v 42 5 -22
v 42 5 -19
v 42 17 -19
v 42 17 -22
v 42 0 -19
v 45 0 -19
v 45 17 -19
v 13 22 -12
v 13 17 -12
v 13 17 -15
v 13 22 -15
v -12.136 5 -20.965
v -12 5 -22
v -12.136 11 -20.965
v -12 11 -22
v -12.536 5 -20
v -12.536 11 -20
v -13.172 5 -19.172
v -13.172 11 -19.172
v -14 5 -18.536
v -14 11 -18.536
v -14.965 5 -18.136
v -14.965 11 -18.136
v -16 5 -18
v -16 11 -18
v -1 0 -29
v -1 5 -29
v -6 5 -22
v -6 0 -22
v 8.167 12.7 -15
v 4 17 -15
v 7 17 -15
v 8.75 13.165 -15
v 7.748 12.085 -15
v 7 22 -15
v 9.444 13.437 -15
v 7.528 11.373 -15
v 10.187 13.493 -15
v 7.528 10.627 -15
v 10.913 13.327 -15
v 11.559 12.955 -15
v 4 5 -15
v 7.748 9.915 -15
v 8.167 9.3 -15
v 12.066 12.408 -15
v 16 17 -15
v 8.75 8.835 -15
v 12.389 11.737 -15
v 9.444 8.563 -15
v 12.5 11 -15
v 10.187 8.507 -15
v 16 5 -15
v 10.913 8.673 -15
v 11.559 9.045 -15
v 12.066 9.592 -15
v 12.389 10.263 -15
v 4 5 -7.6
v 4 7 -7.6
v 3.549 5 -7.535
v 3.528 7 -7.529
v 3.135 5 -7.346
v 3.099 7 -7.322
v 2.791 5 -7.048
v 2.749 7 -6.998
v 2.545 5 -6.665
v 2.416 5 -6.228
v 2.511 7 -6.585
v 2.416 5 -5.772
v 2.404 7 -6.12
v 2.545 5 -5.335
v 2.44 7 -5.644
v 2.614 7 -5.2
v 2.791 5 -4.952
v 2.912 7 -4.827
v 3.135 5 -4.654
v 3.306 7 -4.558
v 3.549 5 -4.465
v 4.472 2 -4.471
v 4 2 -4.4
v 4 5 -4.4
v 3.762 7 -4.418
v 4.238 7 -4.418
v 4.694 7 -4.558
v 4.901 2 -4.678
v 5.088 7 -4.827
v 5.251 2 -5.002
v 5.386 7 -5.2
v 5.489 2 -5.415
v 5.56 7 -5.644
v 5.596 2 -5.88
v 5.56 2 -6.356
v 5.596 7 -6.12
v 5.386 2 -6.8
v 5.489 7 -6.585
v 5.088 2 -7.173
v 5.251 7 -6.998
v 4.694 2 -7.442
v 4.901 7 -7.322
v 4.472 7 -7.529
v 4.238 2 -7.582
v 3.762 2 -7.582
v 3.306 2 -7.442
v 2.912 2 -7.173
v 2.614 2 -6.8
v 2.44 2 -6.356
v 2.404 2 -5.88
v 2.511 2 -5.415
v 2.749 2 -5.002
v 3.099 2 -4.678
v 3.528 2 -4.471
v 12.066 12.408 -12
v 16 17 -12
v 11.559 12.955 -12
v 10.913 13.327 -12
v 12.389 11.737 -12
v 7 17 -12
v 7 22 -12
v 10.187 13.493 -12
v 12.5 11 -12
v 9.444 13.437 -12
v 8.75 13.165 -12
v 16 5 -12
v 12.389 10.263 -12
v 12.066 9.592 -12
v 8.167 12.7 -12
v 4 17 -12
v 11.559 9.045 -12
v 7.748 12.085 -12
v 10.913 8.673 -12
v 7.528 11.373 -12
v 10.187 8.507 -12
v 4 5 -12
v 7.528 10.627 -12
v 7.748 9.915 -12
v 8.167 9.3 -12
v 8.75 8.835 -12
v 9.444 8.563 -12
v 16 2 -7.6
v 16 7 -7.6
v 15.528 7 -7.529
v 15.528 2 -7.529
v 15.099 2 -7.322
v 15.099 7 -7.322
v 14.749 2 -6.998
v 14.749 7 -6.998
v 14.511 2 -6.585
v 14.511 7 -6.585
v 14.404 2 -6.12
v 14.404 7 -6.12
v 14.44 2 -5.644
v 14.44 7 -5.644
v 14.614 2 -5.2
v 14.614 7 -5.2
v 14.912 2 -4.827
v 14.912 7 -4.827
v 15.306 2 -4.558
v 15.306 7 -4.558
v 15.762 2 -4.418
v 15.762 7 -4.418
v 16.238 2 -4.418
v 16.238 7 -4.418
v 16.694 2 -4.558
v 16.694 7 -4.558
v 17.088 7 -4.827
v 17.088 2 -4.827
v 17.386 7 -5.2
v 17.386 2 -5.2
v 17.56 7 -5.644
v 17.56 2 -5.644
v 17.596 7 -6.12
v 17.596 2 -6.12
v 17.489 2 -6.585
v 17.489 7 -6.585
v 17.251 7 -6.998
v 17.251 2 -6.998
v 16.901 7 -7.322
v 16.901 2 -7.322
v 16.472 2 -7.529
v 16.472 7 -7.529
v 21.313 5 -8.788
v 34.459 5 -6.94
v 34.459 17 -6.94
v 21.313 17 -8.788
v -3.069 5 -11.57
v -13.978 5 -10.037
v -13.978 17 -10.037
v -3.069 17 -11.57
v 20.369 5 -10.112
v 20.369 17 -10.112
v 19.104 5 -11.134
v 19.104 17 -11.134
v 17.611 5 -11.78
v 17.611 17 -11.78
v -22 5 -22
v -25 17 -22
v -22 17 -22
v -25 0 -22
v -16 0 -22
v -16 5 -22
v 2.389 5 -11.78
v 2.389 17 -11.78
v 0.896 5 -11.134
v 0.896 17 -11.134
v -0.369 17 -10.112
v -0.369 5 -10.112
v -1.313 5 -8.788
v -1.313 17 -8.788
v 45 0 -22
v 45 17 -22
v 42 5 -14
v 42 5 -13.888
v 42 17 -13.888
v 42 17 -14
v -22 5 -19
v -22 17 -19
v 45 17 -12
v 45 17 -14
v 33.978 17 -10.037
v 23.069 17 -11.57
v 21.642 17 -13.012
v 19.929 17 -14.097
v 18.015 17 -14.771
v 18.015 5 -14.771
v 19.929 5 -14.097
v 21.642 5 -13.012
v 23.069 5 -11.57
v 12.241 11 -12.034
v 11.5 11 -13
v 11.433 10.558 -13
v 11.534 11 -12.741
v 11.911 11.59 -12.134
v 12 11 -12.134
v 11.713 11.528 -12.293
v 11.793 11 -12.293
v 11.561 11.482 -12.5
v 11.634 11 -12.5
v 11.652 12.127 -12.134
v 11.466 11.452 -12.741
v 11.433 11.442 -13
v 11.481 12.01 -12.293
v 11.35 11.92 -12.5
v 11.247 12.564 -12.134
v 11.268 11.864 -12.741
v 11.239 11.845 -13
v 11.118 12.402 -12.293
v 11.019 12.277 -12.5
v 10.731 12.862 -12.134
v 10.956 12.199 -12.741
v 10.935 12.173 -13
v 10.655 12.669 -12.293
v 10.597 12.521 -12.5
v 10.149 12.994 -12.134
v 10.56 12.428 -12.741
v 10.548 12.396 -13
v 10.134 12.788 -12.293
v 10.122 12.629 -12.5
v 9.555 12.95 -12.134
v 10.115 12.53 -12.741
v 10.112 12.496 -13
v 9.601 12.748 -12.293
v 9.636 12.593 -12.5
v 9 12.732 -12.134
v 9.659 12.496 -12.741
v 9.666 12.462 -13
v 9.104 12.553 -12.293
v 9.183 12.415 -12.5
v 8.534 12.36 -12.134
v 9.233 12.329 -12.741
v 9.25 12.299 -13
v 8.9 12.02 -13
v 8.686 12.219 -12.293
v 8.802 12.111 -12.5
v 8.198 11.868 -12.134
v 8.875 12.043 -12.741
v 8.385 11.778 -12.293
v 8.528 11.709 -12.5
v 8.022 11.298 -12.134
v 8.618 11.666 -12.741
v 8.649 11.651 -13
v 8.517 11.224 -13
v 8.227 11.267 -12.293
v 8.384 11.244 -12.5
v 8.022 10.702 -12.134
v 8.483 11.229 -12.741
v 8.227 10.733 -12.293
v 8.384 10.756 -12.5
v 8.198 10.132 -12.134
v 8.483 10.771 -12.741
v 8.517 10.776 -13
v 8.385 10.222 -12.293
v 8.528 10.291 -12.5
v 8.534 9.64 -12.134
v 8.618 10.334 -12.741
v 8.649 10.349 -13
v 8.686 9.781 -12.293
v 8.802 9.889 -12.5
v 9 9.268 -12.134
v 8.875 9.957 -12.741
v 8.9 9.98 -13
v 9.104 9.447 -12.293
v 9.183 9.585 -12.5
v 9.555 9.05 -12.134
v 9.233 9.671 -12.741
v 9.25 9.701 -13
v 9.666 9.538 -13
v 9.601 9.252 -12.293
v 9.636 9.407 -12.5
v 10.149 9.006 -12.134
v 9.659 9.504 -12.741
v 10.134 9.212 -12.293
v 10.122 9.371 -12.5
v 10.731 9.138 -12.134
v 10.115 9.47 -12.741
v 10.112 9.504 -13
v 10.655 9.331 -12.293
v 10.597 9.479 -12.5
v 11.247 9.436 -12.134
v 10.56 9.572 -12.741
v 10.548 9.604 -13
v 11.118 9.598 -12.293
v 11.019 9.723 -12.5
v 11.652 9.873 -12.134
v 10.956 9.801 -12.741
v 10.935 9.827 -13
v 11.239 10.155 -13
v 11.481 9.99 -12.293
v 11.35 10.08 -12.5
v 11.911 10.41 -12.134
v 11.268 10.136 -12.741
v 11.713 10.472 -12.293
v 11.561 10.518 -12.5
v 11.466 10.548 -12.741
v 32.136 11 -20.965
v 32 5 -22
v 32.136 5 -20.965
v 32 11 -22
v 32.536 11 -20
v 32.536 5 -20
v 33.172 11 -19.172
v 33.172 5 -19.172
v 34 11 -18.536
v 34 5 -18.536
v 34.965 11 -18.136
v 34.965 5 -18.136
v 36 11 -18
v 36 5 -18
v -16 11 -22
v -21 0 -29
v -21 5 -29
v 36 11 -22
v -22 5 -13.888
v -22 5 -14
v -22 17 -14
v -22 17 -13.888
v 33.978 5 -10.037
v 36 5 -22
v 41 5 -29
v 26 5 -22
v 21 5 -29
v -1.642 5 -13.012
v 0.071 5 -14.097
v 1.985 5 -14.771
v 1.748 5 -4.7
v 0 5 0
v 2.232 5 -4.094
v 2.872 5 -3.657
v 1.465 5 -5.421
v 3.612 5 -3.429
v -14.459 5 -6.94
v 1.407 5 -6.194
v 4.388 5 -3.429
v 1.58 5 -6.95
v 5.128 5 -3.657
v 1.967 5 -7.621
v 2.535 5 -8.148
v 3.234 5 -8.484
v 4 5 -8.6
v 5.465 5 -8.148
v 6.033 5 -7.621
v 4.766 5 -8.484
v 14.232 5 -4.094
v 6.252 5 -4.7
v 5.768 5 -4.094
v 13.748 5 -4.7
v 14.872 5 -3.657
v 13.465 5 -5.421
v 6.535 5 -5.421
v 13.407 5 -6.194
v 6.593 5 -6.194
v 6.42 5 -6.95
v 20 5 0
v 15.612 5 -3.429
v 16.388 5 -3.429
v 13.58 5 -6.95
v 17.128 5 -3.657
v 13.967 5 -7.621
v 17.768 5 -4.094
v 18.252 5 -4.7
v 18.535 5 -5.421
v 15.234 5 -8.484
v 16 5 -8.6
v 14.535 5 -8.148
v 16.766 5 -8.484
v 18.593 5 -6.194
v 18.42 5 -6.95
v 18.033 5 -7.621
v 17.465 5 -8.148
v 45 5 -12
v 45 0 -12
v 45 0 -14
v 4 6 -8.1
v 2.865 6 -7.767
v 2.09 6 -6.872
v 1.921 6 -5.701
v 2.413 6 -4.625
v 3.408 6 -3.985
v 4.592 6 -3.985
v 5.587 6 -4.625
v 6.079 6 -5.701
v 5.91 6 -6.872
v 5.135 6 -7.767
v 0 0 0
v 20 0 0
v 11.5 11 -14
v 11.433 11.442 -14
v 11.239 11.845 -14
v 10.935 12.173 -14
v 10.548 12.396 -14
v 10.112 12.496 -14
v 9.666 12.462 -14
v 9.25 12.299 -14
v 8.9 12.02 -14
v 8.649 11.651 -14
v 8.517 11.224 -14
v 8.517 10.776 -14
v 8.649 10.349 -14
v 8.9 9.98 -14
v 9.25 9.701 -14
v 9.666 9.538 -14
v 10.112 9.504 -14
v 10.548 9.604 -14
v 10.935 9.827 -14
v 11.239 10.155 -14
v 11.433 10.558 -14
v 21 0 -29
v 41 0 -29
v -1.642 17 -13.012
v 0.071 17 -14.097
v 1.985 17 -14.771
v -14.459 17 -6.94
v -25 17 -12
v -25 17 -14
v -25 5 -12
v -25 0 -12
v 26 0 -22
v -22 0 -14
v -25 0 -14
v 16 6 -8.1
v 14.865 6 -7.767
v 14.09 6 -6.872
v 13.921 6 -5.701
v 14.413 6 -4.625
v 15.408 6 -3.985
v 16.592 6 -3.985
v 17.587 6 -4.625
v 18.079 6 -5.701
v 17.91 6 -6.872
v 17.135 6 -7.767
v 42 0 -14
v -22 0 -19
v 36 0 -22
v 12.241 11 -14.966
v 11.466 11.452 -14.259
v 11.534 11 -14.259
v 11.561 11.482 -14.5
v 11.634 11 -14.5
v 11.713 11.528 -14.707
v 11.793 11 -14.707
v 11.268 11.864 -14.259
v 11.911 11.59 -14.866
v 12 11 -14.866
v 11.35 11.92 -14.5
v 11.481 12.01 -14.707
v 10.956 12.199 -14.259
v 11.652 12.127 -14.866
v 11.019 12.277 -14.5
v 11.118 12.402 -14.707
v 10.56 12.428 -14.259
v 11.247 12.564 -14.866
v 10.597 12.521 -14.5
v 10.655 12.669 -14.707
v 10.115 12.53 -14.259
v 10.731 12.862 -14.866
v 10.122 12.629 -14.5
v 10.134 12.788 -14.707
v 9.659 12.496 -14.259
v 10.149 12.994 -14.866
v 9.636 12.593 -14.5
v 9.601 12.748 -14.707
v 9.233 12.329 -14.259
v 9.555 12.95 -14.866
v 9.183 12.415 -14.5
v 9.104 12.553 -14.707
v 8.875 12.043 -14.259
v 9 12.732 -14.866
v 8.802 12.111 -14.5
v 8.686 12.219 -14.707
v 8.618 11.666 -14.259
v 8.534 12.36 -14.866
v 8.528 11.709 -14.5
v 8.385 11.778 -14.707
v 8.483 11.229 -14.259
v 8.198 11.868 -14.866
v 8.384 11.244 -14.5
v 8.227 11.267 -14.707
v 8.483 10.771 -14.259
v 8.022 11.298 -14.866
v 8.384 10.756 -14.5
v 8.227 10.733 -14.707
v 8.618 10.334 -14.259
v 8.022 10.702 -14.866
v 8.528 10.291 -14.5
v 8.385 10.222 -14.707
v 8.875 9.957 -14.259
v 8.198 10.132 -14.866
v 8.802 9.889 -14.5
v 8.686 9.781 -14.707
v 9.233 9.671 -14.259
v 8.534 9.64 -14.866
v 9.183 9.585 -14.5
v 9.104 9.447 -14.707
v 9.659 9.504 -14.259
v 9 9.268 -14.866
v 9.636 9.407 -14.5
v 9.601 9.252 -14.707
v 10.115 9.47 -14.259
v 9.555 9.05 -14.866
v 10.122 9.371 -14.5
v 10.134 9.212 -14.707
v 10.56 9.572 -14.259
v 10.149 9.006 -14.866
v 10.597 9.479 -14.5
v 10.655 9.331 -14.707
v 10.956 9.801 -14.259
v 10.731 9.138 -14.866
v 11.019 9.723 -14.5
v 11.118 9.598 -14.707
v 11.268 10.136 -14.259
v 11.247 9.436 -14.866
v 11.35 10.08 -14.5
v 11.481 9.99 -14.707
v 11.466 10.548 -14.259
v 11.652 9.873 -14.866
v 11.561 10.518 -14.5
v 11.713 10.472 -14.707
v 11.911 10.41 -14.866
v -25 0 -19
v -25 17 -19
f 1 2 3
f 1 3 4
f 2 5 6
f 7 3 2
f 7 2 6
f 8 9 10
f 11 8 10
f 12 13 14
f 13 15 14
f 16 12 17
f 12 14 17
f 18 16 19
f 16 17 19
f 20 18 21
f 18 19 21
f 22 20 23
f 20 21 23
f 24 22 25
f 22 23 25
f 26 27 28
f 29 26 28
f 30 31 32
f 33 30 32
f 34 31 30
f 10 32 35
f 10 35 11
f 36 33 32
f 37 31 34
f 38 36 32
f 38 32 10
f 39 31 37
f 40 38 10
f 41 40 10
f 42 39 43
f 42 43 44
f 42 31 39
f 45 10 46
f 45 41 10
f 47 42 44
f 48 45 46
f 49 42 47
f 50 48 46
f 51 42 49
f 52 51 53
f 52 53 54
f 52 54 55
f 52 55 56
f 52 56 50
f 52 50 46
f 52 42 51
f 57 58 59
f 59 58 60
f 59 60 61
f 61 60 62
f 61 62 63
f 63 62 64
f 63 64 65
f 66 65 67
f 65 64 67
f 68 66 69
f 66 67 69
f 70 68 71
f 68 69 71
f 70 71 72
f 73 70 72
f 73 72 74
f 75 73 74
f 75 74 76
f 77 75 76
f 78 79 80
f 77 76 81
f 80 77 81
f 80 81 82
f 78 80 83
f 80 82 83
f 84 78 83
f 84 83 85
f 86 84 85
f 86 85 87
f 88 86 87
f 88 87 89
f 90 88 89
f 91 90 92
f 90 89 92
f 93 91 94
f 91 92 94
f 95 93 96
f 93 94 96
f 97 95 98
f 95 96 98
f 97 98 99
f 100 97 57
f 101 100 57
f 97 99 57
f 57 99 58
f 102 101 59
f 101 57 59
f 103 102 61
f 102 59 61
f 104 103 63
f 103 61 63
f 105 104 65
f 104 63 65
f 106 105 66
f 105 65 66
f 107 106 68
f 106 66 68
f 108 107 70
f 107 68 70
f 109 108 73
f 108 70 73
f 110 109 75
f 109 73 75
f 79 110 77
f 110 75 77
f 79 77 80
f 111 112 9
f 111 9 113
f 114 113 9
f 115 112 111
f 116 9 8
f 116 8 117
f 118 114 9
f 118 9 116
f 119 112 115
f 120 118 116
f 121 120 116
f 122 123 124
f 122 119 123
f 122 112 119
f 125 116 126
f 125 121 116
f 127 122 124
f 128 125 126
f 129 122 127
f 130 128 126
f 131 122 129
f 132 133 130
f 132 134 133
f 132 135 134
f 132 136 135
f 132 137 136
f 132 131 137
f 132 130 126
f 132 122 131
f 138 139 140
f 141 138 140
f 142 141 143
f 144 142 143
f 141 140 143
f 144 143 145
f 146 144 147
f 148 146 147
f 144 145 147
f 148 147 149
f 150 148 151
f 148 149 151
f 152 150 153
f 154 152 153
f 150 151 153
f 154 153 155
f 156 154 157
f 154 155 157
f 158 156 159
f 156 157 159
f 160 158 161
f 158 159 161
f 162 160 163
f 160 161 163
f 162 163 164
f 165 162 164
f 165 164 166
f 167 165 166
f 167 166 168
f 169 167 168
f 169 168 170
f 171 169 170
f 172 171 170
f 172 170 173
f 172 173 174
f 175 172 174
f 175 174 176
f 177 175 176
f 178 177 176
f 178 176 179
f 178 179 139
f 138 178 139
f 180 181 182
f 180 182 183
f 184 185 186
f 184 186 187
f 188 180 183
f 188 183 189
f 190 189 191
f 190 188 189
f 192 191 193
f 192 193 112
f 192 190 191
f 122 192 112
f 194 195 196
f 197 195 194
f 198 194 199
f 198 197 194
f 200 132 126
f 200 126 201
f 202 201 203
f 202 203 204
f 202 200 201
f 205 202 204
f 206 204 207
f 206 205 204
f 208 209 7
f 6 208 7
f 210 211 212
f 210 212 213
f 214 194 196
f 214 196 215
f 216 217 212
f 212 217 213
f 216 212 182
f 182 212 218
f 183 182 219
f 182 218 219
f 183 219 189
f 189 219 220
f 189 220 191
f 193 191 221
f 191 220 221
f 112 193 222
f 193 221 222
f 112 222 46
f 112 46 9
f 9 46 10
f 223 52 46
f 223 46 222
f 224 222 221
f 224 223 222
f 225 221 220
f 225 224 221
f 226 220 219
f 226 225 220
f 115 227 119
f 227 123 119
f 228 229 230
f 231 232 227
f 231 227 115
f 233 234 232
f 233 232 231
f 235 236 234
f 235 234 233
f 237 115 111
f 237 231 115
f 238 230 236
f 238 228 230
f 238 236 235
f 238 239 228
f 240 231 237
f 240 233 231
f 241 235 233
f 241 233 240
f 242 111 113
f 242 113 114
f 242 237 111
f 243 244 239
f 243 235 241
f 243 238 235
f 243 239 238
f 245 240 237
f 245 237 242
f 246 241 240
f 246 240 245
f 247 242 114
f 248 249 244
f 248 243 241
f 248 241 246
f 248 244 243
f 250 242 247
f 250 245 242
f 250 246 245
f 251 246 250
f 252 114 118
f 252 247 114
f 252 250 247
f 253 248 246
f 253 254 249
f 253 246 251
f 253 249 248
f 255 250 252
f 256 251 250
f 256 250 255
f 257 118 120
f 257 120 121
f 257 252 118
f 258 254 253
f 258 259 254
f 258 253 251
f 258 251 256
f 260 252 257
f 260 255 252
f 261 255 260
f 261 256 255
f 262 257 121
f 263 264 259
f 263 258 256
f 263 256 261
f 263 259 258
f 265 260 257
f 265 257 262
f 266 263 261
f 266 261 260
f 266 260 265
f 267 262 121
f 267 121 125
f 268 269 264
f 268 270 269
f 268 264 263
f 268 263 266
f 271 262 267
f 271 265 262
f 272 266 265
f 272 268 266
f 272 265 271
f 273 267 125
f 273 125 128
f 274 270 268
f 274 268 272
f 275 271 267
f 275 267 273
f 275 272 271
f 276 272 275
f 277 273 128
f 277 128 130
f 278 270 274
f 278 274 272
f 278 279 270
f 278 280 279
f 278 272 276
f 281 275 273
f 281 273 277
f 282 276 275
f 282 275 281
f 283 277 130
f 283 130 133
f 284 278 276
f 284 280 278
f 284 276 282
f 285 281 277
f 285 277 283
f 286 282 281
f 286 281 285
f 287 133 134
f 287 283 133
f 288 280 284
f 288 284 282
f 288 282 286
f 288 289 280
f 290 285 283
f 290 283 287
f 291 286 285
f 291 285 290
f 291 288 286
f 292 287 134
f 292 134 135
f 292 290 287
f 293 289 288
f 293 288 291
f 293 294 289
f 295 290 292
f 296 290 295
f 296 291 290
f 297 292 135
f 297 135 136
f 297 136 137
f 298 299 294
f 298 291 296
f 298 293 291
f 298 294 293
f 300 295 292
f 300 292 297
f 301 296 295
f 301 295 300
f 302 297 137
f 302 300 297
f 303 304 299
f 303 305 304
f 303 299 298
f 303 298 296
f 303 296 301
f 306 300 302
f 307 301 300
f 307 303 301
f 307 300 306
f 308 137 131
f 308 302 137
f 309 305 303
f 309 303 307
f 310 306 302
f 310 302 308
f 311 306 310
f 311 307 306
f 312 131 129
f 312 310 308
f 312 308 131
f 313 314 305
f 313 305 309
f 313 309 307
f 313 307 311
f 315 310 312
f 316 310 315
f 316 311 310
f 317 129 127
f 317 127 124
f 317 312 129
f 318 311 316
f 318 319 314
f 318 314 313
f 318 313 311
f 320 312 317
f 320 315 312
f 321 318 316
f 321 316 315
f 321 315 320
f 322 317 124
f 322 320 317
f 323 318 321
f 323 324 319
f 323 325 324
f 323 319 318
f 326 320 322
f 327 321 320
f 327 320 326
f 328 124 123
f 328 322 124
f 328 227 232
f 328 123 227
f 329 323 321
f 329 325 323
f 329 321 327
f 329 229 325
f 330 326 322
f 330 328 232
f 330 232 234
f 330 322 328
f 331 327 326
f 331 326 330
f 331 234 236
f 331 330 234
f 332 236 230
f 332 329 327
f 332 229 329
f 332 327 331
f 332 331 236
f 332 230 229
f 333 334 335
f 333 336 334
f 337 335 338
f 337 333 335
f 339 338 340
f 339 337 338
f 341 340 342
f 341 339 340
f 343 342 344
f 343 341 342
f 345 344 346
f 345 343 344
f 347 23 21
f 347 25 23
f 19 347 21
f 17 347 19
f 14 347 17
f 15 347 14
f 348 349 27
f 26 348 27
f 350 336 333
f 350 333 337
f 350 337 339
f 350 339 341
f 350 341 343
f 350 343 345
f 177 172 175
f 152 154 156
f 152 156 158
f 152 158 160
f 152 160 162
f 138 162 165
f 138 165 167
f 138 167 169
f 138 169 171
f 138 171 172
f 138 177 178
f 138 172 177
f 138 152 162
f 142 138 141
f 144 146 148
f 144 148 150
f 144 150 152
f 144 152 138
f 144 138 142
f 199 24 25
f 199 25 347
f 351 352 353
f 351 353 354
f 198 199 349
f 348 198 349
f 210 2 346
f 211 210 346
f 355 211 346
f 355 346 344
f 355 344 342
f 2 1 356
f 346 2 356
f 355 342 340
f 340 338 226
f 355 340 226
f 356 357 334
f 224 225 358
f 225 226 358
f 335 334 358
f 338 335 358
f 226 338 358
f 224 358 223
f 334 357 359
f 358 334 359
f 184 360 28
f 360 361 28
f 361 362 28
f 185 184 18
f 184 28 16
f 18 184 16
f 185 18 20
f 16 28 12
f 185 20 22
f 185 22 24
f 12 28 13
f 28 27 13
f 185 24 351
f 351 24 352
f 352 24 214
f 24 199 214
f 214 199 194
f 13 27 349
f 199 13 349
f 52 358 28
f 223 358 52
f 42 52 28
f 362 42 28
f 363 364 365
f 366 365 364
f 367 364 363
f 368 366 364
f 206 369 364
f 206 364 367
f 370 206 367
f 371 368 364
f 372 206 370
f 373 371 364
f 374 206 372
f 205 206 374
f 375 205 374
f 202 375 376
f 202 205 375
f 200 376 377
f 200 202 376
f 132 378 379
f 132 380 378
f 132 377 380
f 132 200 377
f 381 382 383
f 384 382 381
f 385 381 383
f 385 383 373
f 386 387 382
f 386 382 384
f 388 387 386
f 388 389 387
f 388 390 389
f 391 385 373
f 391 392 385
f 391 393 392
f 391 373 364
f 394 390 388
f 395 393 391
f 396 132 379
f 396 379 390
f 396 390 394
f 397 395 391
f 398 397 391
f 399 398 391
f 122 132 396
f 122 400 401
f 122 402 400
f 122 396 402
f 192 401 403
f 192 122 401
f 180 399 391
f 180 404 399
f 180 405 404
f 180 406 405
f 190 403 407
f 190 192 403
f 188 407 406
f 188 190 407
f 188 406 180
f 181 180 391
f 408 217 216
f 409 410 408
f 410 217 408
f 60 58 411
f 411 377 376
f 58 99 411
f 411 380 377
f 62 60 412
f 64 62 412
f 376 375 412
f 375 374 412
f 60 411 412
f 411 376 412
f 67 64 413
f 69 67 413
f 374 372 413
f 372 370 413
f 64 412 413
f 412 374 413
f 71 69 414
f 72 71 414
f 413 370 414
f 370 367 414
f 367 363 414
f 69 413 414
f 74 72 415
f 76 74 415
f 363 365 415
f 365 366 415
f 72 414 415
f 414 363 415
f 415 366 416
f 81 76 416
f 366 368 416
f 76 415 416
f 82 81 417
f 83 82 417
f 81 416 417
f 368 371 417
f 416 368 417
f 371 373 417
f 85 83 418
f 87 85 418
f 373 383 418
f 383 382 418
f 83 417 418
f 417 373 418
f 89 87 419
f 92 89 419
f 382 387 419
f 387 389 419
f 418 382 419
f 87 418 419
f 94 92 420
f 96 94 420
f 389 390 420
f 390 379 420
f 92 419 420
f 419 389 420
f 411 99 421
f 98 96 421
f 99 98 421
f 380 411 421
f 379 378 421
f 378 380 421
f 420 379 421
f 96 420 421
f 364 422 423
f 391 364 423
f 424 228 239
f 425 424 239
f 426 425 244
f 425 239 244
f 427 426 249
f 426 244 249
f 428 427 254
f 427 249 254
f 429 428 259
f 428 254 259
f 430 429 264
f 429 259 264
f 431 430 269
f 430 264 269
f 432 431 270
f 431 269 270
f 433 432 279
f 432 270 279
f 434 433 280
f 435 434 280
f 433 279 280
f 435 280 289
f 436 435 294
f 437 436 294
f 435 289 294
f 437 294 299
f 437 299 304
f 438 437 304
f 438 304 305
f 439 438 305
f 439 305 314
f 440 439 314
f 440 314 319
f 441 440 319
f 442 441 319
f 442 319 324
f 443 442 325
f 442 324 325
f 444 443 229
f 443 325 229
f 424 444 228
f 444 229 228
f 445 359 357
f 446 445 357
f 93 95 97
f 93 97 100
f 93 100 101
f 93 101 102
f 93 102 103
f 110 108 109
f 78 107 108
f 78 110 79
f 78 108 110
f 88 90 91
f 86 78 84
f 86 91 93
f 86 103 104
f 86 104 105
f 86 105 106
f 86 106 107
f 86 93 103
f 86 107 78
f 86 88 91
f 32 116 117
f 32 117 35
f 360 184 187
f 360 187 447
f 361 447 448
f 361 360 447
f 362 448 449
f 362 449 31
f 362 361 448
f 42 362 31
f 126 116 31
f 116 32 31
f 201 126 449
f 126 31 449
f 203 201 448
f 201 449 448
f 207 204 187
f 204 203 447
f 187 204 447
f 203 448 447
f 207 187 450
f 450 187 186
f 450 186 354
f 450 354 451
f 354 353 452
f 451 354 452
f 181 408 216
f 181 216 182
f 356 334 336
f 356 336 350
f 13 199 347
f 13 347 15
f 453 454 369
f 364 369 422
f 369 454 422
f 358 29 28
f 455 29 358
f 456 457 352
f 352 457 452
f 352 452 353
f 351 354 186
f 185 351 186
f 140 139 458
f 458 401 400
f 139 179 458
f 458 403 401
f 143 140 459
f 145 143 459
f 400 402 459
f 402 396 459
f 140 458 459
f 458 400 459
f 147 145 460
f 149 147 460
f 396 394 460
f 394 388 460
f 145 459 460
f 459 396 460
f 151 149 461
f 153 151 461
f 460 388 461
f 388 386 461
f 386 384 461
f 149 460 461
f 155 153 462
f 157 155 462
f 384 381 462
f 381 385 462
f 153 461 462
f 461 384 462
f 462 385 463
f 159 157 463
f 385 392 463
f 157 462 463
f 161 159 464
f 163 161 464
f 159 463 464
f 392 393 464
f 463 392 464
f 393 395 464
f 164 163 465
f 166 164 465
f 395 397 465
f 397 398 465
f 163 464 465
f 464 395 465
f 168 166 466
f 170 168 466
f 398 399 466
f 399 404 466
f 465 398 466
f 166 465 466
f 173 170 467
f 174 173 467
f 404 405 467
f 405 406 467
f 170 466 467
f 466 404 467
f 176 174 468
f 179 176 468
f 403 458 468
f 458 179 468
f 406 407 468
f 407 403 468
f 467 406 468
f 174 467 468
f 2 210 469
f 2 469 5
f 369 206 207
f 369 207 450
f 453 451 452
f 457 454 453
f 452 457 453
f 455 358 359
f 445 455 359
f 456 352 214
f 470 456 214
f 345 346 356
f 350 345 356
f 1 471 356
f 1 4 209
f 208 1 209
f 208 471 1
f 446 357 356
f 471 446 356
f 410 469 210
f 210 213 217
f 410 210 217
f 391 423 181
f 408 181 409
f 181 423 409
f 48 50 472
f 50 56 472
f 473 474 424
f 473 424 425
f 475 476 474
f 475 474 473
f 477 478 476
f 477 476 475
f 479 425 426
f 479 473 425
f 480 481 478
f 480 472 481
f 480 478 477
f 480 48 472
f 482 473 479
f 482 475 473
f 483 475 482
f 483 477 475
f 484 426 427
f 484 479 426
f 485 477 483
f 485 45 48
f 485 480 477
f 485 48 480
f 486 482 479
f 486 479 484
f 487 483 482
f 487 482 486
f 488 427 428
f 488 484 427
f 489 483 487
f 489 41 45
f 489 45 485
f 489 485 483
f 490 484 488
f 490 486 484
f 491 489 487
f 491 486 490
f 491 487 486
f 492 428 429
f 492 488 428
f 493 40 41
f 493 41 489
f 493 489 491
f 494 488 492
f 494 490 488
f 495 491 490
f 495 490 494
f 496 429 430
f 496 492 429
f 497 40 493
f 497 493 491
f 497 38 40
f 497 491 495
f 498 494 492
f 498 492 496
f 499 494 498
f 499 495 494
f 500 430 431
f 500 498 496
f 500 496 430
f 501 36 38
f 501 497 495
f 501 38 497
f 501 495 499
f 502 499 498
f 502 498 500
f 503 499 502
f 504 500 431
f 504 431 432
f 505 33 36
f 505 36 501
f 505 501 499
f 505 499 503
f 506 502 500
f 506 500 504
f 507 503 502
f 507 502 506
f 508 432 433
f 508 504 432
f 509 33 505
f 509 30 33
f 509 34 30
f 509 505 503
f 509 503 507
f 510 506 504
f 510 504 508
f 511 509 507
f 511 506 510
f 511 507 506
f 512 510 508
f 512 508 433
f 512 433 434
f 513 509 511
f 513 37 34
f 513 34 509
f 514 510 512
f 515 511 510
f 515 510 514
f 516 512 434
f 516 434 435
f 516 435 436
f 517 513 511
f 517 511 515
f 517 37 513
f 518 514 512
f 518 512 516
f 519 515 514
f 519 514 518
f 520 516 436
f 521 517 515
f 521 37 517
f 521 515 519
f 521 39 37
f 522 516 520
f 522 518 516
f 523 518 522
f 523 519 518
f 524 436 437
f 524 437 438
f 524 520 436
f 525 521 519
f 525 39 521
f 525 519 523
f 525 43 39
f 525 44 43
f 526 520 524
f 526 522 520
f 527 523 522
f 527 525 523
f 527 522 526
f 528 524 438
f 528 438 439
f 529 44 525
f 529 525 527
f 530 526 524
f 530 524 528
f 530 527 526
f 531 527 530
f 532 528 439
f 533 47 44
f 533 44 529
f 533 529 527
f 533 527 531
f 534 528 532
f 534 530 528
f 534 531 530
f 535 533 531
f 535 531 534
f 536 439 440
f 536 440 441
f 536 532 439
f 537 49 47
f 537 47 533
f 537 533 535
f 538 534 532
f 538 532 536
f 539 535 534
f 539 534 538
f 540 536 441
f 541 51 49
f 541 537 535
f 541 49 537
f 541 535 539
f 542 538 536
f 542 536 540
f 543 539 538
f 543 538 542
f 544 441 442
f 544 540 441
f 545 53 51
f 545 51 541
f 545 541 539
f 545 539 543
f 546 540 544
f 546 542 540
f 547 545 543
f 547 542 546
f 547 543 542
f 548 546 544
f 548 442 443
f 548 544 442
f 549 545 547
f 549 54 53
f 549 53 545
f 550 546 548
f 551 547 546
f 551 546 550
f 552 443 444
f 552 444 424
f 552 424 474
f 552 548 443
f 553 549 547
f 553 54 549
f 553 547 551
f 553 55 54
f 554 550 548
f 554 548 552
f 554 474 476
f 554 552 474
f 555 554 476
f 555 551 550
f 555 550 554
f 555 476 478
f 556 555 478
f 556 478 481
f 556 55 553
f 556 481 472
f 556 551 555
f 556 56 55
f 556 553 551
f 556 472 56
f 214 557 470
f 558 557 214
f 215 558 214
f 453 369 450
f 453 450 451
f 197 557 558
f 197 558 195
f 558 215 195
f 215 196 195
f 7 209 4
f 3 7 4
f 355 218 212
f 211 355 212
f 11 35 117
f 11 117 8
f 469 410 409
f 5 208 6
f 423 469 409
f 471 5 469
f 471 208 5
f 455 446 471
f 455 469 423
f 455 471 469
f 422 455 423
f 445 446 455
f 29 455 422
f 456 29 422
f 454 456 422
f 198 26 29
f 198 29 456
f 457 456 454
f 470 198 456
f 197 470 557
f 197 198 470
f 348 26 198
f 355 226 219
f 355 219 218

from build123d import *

# Parameters (mm, degrees)
BOSS_EXTRUDE1_DEPTH = 5
SKETCH2_R           = 1.6
CUT_EXTRUDE1_DEPTH  = 3
BOSS_EXTRUDE2_DEPTH = 12
SKETCH8_R           = 1.5
CUT_EXTRUDE2_DEPTH  = 3
FILLET1_R           = 1
SKETCH9_W           = 6
SKETCH9_H           = 3
BOSS_EXTRUDE3_DEPTH = 5
SKETCH12_W          = 3
SKETCH12_H          = 5
CUT_EXTRUDE4_DEPTH  = 17
SKETCH14_W          = 4
SKETCH14_H          = 4
BOSS_EXTRUDE5_DEPTH = 6
FILLET3_R           = 4
FILLET4_R           = 4
BOSS_EXTRUDE6_DEPTH = 5


with BuildPart() as part:
    # Sketch1 → Boss-Extrude1 (new body)
    with BuildSketch(Plane(origin=(0, 0, 0), x_dir=(1, 0, 0), z_dir=(0, 1, 0))):
        Polygon((0, 0), (20, 0), (45, 12), (45, 22), (-25, 22), (-25, 12), align=None)
    extrude(amount=BOSS_EXTRUDE1_DEPTH)

    # Sketch2 → Cut-Extrude1 (cut)
    with BuildSketch(Plane(origin=(0, 5, 0), x_dir=(1, 0, 0), z_dir=(0, 1, 0))):
        with Locations(Location((4, 6, 0), (0, 0, 270))):
            Circle(SKETCH2_R)
        with Locations(Location((16, 6, 0), (0, 0, 90))):
            Circle(SKETCH2_R)
    extrude(amount=-CUT_EXTRUDE1_DEPTH, mode=Mode.SUBTRACT)

    # Sketch3 → Boss-Extrude2 (add)
    with BuildSketch(Plane(origin=(0, 5, 0), x_dir=(1, 0, 0), z_dir=(0, 1, 0))):
        with BuildLine():
            Line((-1.313075459, 8.787692444), (-14.45873126, 6.940191005))
            Line((-14.45873126, 6.940191005), (-25, 12))
            Line((-25, 12), (-25, 22))
            Line((-25, 22), (-22, 22))
            Line((-22, 22), (-22, 13.88770191))
            Line((-22, 13.88770191), (-13.978151779, 10.037214764))
            Line((-13.978151779, 10.037214764), (-3.068994172, 11.57039688))
            ThreePointArc((-3.068994172, 11.57039688), (0.071487045, 14.097332027), (4, 15))
            Line((4, 15), (16, 15))
            ThreePointArc((16, 15), (19.928512955, 14.097332027), (23.068994172, 11.57039688))
            Line((23.068994172, 11.57039688), (33.978151779, 10.037214764))
            Line((33.978151779, 10.037214764), (42, 13.88770191))
            Line((42, 13.88770191), (42, 22))
            Line((42, 22), (45, 22))
            Line((45, 22), (45, 12))
            Line((45, 12), (34.45873126, 6.940191005))
            Line((34.45873126, 6.940191005), (21.313075459, 8.787692444))
            ThreePointArc((21.313075459, 8.787692444), (19.104339329, 11.134498742), (16, 12))
            Line((16, 12), (4, 12))
            ThreePointArc((4, 12), (0.895660671, 11.134498742), (-1.313075459, 8.787692444))
        make_face()
    extrude(amount=BOSS_EXTRUDE2_DEPTH)

    # Sketch6 → Revolve1 (revolve)
    with BuildSketch(Plane.XY.offset(-6), mode=Mode.PRIVATE) as revolve1_sk:
        Polygon((2.4, 5), (2.4, 7), (1.4, 5), align=None)
    revolve(revolve1_sk.sketch.rotate(Axis((4, 5, -6), (0, 1, 0)), 270), axis=Axis((4, 5, -6), (0, 1, 0)))

    # Sketch7 → Revolve2 (revolve)
    with BuildSketch(Plane.XY.offset(-6), mode=Mode.PRIVATE) as revolve2_sk:
        Polygon((14.4, 5), (14.4, 7), (13.4, 5), align=None)
    revolve(revolve2_sk.sketch.rotate(Axis((16, 5, -6), (0, 1, 0)), 270), axis=Axis((16, 5, -6), (0, 1, 0)))

    # Sketch8 → Cut-Extrude2 (cut)
    with BuildSketch(Plane.XY.offset(-12)):
        with Locations((10, 11)):
            Circle(SKETCH8_R)
    extrude(amount=-CUT_EXTRUDE2_DEPTH, mode=Mode.SUBTRACT)

    # Fillet1
    fillet1_edges = [part.edges().sort_by_distance(p)[0] for p in [
        (8.5, 11, -15),
        (8.5, 11, -12),
    ]]
    fillet(fillet1_edges, radius=FILLET1_R)

    # Sketch9 → Boss-Extrude3 (add)
    with BuildSketch(Plane(origin=(0, 17, 0), x_dir=(1, 0, 0), z_dir=(0, 1, 0))):
        with Locations((10, 13.5)):
            Rectangle(SKETCH9_W, SKETCH9_H)
    extrude(amount=BOSS_EXTRUDE3_DEPTH)

    # Sketch12 → Cut-Extrude4 (cut)
    with BuildSketch(Plane(origin=(0, 17, 0), x_dir=(1, 0, 0), z_dir=(0, 1, 0))):
        with Locations((-23.5, 16.5)):
            Rectangle(SKETCH12_W, SKETCH12_H)
        with Locations((43.5, 16.5)):
            Rectangle(SKETCH12_W, SKETCH12_H)
    extrude(amount=-CUT_EXTRUDE4_DEPTH, mode=Mode.SUBTRACT)

    # Sketch14 → Boss-Extrude5 (add)
    with BuildSketch(Plane(origin=(0, 5, 0), x_dir=(1, 0, 0), z_dir=(0, 1, 0))):
        with Locations((34, 20)):
            Rectangle(SKETCH14_W, SKETCH14_H)
        with Locations((-14, 20)):
            Rectangle(SKETCH14_W, SKETCH14_H)
    extrude(amount=BOSS_EXTRUDE5_DEPTH)

    # Fillet3
    fillet3_edges = [part.edges().sort_by_distance(p)[0] for p in [
        (32, 8, -18),
    ]]
    fillet(fillet3_edges, radius=FILLET3_R - 0.0001)  # a hair under: the kernel refuses the full size

    # Fillet4
    fillet4_edges = [part.edges().sort_by_distance(p)[0] for p in [
        (-12, 8, -18),
    ]]
    fillet(fillet4_edges, radius=FILLET4_R - 0.0001)  # a hair under: the kernel refuses the full size

    # Sketch15 → Boss-Extrude6 (add)
    with BuildSketch(Plane(origin=(0, 5, 0), x_dir=(1, 0, 0), z_dir=(0, 1, 0))):
        Polygon((-16, 22), (-21, 29), (-1, 29), (-6, 22), align=None)
        Polygon((36, 22), (26, 22), (21, 29), (41, 29), align=None)
    extrude(amount=-BOSS_EXTRUDE6_DEPTH)


solid = part.part
